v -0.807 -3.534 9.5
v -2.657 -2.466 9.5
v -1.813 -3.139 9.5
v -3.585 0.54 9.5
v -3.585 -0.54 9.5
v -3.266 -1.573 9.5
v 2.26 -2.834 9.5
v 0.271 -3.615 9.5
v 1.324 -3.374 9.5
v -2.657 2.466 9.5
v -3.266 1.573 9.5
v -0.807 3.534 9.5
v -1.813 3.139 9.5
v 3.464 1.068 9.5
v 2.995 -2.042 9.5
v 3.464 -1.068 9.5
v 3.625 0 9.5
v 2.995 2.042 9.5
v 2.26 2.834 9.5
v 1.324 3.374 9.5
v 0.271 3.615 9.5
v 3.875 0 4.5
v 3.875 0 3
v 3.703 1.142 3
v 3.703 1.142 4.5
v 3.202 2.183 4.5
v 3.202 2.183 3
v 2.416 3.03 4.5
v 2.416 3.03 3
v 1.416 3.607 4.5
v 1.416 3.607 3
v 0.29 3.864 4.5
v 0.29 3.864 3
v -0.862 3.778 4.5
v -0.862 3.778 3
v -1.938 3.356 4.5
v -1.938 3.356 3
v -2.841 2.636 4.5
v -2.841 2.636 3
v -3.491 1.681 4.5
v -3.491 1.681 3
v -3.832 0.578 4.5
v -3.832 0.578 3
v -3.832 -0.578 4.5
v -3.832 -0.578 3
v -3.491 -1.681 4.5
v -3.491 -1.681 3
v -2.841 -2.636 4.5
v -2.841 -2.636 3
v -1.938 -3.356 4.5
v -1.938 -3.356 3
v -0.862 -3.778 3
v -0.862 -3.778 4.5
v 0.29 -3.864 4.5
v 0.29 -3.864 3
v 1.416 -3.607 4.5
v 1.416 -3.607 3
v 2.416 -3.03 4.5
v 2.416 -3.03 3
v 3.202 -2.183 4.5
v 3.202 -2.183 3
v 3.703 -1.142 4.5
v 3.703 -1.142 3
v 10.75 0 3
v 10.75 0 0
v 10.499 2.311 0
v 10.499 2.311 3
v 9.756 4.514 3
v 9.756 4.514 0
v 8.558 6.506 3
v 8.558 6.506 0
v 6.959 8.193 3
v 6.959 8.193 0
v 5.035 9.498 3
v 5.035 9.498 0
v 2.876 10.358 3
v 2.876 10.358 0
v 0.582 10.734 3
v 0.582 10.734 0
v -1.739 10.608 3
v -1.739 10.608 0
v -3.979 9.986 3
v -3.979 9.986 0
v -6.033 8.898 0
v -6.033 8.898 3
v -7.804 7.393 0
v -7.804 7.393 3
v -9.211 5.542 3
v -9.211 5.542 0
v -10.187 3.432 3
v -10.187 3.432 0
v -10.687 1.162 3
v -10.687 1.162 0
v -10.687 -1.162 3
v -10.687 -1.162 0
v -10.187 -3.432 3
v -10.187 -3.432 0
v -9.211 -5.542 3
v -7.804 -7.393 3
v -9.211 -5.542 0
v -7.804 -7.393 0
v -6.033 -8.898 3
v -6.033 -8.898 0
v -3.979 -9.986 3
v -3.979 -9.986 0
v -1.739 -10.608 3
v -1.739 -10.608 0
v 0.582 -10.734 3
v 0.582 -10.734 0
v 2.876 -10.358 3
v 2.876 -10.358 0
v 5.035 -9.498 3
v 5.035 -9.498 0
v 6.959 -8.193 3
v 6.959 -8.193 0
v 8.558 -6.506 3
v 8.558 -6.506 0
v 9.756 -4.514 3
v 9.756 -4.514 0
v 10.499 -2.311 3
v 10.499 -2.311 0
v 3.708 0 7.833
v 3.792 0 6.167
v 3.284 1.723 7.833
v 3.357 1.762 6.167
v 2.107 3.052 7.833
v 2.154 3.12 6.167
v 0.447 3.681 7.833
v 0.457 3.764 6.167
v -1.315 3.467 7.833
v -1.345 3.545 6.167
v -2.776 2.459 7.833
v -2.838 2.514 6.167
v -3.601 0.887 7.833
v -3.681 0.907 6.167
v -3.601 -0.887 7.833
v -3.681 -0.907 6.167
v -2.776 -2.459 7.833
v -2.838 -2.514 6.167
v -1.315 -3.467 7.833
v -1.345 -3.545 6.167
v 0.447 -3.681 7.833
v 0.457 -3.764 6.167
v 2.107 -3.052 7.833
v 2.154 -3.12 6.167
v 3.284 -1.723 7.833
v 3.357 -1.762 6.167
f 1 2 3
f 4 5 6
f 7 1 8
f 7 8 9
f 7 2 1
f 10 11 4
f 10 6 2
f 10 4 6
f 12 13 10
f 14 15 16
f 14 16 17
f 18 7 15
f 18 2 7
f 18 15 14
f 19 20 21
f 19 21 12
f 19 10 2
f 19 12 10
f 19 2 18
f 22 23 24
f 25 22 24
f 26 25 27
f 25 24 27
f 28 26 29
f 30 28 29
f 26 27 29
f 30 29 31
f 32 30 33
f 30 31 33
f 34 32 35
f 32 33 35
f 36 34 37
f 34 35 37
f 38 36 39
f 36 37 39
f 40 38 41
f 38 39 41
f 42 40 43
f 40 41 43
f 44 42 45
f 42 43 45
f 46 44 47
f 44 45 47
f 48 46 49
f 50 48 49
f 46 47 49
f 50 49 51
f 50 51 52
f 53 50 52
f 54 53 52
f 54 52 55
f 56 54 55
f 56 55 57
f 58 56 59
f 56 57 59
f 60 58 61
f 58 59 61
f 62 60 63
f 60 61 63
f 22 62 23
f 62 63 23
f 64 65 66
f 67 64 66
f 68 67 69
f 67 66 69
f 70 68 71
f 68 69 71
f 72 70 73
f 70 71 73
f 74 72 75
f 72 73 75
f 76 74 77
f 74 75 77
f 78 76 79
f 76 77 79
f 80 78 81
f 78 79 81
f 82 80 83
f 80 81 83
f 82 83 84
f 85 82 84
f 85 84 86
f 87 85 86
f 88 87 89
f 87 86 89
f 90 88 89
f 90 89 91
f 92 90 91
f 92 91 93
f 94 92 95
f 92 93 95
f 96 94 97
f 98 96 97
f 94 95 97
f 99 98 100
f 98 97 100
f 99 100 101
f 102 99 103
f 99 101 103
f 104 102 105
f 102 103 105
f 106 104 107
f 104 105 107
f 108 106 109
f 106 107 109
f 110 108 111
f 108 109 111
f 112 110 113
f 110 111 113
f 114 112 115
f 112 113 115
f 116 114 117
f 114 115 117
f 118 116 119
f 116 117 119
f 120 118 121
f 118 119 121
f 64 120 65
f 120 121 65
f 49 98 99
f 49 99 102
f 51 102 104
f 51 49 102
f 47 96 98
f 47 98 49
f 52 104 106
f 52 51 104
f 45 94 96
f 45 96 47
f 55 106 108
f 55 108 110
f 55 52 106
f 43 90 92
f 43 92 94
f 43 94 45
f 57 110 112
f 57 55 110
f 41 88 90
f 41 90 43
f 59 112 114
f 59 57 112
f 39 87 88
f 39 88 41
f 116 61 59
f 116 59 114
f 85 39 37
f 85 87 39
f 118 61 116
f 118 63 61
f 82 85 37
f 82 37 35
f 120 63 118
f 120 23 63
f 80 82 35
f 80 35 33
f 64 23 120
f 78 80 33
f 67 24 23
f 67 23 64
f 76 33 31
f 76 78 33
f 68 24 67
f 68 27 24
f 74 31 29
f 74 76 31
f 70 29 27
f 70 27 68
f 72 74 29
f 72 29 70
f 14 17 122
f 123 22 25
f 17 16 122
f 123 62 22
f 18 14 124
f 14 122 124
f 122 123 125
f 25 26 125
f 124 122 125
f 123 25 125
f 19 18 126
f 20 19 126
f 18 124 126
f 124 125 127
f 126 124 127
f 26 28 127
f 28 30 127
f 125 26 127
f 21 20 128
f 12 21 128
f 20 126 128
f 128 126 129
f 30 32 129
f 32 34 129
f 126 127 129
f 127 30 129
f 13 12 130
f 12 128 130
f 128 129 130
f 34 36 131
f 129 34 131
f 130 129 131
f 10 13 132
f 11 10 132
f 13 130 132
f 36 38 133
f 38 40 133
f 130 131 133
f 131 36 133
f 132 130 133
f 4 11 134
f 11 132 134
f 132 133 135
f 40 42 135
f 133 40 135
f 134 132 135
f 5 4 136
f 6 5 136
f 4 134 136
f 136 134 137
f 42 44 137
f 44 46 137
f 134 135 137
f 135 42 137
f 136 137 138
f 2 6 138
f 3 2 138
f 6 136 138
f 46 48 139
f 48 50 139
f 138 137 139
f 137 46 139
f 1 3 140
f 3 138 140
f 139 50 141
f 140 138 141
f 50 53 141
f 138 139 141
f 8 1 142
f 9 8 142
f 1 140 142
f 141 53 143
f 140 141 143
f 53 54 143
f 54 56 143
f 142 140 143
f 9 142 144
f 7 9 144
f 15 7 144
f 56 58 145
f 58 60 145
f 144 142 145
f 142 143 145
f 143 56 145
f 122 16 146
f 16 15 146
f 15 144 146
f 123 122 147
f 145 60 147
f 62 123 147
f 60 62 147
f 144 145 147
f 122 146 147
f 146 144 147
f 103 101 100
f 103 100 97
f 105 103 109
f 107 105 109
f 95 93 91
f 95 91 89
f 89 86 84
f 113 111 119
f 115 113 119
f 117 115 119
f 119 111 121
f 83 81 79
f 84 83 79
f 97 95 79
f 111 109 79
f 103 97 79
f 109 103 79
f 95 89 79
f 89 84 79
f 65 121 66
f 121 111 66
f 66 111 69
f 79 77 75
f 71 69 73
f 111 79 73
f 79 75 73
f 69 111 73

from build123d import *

# Parameters (mm, degrees)
F0_R     = 10.75
F1_DEPTH = 3
F2_R     = 3.875
F3_DEPTH = 6.5
F4_SIZE2 = 5
F4_SIZE  = 0.25


with BuildPart() as f1:
    # F0 (on Top) → F1 (new body)
    with BuildSketch(Plane.XY):
        Circle(F0_R)
    extrude(amount=F1_DEPTH)

    # F2 (on face) → F3 (join)
    with BuildSketch(Plane.XY.offset(3)):
        Circle(F2_R)
    extrude(amount=F3_DEPTH)

    # F4
    f4_edges = [f1.edges().sort_by_distance(p)[0] for p in [
        (-3.875, 0, 9.5),
    ]]
    f4_side = f1.faces().sort_by_distance((0, 0, 9.5))[0]
    chamfer(f4_edges, length=F4_SIZE, length2=F4_SIZE2, reference=f4_side)


solid = f1.part
